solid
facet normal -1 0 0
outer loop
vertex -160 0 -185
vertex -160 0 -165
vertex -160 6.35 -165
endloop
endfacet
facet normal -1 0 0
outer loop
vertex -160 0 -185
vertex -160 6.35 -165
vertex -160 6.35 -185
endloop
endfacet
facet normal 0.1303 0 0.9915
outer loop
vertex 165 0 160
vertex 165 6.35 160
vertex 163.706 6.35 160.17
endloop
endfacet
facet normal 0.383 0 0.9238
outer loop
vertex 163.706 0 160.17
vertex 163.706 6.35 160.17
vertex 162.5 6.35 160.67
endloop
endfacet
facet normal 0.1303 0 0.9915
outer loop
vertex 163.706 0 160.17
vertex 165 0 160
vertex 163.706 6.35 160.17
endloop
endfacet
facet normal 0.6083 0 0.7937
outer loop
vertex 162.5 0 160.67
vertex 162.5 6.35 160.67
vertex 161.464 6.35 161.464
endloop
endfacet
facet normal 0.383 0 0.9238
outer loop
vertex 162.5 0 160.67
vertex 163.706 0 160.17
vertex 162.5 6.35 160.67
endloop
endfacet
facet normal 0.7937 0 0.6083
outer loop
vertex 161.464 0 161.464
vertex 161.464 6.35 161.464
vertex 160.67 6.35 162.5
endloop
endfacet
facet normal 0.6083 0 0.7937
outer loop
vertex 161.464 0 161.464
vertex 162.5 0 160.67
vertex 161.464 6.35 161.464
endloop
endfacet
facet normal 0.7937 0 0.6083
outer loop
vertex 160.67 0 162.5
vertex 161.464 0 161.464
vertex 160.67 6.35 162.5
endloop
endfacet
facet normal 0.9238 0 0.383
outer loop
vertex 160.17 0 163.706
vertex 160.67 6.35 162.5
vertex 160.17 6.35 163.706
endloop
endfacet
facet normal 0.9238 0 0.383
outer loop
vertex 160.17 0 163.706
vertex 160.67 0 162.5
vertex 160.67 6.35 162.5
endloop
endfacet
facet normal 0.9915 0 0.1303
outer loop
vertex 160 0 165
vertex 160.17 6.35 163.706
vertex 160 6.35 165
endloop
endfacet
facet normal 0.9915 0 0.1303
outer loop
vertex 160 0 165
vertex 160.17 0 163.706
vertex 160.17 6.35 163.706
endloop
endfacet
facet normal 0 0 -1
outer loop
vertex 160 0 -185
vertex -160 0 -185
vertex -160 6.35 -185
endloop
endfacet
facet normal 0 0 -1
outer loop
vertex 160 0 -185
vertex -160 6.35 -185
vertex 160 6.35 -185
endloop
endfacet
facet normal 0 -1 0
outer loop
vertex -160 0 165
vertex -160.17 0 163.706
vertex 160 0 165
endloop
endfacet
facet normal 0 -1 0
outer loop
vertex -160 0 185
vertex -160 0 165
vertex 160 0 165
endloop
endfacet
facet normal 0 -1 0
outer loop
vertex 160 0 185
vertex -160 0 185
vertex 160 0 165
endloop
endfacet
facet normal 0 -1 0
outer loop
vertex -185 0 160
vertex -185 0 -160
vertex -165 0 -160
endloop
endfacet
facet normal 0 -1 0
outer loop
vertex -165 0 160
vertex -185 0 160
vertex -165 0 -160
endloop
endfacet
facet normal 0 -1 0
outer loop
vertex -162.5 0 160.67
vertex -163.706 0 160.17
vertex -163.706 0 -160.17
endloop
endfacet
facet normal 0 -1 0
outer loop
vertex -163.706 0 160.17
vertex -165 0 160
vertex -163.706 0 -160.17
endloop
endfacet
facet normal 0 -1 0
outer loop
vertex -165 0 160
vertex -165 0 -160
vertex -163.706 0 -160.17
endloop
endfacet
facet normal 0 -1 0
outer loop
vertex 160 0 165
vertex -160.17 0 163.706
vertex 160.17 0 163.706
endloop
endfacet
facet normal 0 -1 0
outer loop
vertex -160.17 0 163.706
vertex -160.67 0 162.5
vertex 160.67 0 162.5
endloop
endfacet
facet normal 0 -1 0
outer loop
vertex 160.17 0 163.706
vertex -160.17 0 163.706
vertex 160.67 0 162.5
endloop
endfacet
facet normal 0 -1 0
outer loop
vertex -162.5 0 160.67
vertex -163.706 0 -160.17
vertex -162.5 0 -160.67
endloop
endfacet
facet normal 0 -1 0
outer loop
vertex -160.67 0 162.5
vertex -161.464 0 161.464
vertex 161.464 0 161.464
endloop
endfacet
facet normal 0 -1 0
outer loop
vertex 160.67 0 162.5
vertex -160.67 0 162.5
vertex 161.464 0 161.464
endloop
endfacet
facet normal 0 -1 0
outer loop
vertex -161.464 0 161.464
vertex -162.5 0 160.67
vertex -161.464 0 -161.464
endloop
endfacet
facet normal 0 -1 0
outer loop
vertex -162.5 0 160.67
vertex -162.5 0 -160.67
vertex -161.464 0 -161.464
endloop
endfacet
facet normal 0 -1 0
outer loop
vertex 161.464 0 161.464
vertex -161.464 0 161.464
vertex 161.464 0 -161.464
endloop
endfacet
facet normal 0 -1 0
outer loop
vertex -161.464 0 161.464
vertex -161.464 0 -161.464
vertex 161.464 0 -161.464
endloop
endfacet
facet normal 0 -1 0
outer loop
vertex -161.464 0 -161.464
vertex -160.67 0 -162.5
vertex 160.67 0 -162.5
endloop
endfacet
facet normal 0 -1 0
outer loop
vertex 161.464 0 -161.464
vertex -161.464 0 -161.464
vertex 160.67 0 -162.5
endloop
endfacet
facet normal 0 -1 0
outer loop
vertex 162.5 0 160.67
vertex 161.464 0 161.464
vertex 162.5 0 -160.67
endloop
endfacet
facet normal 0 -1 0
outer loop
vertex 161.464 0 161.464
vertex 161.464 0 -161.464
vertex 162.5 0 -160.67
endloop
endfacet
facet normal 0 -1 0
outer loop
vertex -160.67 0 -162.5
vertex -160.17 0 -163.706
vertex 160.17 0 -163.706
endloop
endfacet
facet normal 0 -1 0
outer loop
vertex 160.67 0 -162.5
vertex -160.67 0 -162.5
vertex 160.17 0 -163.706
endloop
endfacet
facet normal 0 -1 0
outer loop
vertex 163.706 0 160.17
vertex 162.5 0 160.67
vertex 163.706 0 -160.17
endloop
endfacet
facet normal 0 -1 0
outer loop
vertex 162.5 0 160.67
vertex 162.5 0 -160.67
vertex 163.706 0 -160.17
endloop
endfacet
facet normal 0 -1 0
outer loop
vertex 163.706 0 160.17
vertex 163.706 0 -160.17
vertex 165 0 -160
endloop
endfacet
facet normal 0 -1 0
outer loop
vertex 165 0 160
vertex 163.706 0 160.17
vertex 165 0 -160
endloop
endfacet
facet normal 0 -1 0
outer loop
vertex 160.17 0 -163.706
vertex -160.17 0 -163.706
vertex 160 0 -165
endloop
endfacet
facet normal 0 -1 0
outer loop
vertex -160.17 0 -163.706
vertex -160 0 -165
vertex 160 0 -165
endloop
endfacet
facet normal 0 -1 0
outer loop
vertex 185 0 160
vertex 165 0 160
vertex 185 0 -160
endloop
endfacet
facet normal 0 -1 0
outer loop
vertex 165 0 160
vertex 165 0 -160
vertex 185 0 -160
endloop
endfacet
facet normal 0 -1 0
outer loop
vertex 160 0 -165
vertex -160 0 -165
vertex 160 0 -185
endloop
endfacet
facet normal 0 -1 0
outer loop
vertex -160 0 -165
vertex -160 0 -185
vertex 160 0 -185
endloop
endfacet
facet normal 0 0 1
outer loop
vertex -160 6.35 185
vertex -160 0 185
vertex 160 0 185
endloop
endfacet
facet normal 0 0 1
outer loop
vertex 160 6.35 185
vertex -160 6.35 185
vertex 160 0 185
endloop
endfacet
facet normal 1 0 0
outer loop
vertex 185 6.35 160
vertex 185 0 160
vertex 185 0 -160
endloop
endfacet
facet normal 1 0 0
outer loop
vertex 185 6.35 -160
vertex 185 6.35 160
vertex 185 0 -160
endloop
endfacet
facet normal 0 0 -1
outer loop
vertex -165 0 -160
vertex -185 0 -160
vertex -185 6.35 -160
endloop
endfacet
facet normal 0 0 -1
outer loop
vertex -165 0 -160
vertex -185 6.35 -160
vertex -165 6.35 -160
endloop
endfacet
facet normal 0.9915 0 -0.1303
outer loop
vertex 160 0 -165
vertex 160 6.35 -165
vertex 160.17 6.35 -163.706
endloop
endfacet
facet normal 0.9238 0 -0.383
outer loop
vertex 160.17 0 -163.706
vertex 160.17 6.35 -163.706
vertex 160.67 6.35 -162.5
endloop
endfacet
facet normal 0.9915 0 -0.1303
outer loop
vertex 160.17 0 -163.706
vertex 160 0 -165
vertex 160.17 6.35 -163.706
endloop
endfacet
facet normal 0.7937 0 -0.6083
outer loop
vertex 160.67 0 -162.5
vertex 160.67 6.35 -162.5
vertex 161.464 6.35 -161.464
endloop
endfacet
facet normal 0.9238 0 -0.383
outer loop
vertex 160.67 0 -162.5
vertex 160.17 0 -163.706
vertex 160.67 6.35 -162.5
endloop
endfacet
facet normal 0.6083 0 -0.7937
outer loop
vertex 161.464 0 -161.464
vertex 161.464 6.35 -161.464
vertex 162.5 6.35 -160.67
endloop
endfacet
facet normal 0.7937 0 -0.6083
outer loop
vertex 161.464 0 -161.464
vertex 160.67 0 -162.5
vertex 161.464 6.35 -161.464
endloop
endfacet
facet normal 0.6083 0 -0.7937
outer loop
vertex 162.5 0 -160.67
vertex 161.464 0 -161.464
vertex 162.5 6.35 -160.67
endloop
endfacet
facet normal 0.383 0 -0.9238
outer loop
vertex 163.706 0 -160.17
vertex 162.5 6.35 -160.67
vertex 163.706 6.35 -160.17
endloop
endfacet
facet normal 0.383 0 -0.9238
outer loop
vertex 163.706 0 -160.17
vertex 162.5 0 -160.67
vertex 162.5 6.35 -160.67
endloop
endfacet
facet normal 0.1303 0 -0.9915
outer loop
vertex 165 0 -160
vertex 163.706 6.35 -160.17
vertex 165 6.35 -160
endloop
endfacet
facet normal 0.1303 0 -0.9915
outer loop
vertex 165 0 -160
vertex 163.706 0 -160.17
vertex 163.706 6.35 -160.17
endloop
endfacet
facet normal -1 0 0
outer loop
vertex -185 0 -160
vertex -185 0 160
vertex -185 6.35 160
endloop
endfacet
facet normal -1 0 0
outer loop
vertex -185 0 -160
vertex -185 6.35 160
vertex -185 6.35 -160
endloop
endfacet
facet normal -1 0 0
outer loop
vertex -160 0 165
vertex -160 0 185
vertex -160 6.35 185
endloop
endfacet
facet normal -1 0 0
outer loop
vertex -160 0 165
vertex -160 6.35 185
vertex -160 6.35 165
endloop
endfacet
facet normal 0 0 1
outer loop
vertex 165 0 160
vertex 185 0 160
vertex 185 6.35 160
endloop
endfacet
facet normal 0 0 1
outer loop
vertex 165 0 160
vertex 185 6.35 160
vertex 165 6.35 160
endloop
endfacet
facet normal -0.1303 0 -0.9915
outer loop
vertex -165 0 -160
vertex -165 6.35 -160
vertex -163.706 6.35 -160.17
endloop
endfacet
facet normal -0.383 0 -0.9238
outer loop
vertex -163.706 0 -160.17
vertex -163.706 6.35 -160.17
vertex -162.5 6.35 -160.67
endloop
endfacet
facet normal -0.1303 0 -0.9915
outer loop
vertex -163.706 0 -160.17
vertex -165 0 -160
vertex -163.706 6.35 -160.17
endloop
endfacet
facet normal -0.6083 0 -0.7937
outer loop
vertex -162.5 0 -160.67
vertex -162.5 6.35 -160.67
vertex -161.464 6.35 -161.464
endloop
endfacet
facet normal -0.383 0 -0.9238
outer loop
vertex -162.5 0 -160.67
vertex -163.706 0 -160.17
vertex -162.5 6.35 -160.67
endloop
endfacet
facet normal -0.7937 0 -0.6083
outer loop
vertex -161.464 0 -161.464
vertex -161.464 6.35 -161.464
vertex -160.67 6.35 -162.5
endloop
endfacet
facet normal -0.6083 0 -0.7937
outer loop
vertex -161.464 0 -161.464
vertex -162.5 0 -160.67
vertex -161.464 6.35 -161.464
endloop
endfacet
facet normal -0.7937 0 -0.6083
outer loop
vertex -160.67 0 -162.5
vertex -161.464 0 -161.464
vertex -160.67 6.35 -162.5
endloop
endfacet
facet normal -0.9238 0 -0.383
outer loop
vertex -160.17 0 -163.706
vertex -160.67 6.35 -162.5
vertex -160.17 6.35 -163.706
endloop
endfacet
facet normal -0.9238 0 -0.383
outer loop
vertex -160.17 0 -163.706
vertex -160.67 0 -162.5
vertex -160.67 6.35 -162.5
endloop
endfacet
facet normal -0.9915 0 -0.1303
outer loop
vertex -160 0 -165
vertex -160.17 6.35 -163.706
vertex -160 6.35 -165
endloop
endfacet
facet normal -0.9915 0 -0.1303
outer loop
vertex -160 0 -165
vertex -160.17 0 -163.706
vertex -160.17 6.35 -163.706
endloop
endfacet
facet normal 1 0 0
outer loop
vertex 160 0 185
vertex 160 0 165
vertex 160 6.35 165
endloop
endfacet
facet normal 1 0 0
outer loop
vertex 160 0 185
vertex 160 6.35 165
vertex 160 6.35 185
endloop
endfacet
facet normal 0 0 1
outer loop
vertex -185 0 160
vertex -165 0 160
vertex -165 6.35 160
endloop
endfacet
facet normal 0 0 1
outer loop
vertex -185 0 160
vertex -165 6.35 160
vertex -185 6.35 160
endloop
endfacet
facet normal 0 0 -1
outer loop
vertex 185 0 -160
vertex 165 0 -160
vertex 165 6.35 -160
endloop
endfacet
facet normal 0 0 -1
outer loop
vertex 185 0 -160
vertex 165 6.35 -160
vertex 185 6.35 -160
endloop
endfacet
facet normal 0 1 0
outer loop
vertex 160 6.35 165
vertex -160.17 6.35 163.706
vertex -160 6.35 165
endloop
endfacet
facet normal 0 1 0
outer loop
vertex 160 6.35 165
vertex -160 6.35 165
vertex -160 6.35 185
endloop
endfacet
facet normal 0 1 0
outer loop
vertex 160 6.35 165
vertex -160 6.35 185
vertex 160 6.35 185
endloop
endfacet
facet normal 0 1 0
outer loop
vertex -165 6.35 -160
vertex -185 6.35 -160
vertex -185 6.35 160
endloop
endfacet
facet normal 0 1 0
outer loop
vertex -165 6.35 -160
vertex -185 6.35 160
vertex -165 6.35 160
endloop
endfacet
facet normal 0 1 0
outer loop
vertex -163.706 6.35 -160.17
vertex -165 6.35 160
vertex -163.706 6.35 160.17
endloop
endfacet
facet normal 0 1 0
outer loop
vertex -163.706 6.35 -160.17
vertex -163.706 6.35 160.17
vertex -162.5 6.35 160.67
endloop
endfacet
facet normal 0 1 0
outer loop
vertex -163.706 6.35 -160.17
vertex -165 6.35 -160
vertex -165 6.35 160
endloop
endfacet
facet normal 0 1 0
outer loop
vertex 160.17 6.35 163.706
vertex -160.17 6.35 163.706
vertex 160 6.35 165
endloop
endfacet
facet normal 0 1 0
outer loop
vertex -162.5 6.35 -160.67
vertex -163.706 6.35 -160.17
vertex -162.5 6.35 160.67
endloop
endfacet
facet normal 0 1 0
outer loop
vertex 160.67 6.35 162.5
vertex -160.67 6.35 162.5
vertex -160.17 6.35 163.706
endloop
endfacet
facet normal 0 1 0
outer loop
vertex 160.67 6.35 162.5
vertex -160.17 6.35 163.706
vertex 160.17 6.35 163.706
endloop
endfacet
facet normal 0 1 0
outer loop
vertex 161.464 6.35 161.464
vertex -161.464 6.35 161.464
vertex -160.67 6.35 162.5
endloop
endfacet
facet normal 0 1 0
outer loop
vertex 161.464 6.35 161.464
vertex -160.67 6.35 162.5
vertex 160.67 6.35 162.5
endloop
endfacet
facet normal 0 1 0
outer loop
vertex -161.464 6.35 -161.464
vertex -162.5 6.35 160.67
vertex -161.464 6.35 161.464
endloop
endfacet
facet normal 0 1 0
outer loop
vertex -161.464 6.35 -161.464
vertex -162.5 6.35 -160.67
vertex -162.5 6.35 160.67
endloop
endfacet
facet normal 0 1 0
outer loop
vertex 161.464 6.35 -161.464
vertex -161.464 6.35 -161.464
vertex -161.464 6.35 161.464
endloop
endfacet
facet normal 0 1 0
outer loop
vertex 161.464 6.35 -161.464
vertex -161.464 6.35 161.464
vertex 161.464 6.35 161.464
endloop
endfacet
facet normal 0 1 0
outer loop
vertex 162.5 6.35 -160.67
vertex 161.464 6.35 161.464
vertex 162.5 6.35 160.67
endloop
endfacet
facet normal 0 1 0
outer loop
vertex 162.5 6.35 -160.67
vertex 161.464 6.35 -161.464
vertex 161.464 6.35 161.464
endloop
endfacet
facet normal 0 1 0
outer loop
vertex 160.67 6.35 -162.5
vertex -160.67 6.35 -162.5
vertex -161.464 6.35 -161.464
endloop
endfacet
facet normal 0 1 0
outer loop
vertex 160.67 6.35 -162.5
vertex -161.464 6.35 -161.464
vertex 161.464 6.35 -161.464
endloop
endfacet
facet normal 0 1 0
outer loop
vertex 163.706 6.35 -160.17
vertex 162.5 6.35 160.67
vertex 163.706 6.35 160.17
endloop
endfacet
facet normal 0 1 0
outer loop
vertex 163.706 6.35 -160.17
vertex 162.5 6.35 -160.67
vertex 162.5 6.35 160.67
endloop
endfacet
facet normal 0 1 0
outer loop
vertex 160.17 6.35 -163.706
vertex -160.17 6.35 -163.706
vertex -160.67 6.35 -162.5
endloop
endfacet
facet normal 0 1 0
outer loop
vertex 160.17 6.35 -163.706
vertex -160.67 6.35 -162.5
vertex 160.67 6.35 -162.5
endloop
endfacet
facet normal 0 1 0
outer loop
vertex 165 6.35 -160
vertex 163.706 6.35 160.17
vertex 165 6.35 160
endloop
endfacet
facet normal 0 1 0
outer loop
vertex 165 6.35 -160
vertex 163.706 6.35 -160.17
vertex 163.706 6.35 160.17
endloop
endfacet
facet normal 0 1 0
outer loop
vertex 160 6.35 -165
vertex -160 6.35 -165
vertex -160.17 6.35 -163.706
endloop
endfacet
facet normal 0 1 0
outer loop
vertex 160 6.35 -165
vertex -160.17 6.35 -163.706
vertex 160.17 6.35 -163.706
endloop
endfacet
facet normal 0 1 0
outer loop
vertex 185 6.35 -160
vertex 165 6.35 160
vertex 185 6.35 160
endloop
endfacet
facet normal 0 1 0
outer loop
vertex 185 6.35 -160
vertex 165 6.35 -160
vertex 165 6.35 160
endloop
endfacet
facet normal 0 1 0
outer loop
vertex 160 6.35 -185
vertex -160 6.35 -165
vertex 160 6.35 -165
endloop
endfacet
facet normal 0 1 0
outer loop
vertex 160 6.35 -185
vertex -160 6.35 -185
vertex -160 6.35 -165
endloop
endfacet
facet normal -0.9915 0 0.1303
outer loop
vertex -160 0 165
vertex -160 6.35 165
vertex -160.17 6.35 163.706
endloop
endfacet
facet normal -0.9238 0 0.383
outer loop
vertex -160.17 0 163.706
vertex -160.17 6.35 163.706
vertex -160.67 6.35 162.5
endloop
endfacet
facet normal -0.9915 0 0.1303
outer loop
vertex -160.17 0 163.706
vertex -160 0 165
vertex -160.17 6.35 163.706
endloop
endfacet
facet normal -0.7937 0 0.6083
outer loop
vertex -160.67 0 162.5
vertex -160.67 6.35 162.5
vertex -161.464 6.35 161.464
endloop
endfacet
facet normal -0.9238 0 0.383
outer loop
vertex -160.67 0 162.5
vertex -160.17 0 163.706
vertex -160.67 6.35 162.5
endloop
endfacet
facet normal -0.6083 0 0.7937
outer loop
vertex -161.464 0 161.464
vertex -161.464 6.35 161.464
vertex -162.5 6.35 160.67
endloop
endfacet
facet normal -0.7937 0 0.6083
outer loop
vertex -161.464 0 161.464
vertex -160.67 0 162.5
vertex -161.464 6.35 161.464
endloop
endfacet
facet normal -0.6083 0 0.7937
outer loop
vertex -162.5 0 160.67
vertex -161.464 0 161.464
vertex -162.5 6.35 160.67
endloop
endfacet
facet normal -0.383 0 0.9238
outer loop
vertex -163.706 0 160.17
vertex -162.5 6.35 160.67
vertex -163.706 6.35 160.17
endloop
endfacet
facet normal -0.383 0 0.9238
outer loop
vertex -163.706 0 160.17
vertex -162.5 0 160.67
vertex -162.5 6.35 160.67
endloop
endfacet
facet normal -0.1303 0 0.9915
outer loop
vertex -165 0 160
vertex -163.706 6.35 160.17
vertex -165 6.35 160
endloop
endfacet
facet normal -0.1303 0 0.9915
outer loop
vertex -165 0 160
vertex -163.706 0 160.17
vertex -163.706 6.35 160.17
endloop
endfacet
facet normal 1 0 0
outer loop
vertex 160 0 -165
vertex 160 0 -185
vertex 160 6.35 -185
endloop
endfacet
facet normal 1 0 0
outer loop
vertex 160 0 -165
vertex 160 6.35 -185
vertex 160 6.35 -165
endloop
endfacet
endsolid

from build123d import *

# Parameters (mm, degrees)
SKETCH1_W                      = 370
SKETCH1_H                      = 370
BOSS_EXTRUDE1_DEPTH            = 6.35
CUT_EXTRUDE2_REACH             = 263.707
CUT_EXTRUDE2_DIRECTION_2_DEPTH = 262.706558


with BuildPart() as part:
    # Sketch1 → Boss-Extrude1 (new body)
    with BuildSketch(Plane(origin=(0, 0, 0), x_dir=(1, 0, 0), z_dir=(0, 1, 0))):
        Rectangle(SKETCH1_W, SKETCH1_H)
    extrude(amount=BOSS_EXTRUDE1_DEPTH)

    # Sketch2 → Cut-Extrude2 (cut, up to next)
    with BuildSketch(Plane(origin=(0, 0, 0), x_dir=(1, 0, 0), z_dir=(0, 1, 0)), mode=Mode.PRIVATE) as cut_extrude2_sk1:
        with BuildLine():
            Line((-185, 185), (-185, 160))
            Line((-185, 160), (-165, 160))
            ThreePointArc((-165, 160), (-161.464466094, 161.464466094), (-160, 165))
            Line((-160, 165), (-160, 185))
            Line((-160, 185), (-185, 185))
        make_face()
    cut_extrude2_tool1 = extrude(cut_extrude2_sk1.sketch, amount=CUT_EXTRUDE2_REACH, mode=Mode.PRIVATE) & part.part
    # Sketch2 → Cut-Extrude2 (cut, up to next)
    with BuildSketch(Plane(origin=(0, 0, 0), x_dir=(1, 0, 0), z_dir=(0, 1, 0)), mode=Mode.PRIVATE) as cut_extrude2_sk2:
        with BuildLine():
            Line((-185, -185), (-160, -185))
            Line((-160, -185), (-160, -165))
            ThreePointArc((-160, -165), (-161.464466094, -161.464466094), (-165, -160))
            Line((-165, -160), (-185, -160))
            Line((-185, -160), (-185, -185))
        make_face()
    cut_extrude2_tool2 = extrude(cut_extrude2_sk2.sketch, amount=CUT_EXTRUDE2_REACH, mode=Mode.PRIVATE) & part.part
    # Sketch2 → Cut-Extrude2 (cut, up to next)
    with BuildSketch(Plane(origin=(0, 0, 0), x_dir=(1, 0, 0), z_dir=(0, 1, 0)), mode=Mode.PRIVATE) as cut_extrude2_sk3:
        with BuildLine():
            Line((185, 185), (160, 185))
            Line((160, 185), (160, 165))
            ThreePointArc((160, 165), (161.464466094, 161.464466094), (165, 160))
            Line((165, 160), (185, 160))
            Line((185, 160), (185, 185))
        make_face()
    cut_extrude2_tool3 = extrude(cut_extrude2_sk3.sketch, amount=CUT_EXTRUDE2_REACH, mode=Mode.PRIVATE) & part.part
    # Sketch2 → Cut-Extrude2 (cut, up to next)
    with BuildSketch(Plane(origin=(0, 0, 0), x_dir=(1, 0, 0), z_dir=(0, 1, 0)), mode=Mode.PRIVATE) as cut_extrude2_sk4:
        with BuildLine():
            Line((185, -185), (185, -160))
            Line((185, -160), (165, -160))
            ThreePointArc((165, -160), (161.464466094, -161.464466094), (160, -165))
            Line((160, -165), (160, -185))
            Line((160, -185), (185, -185))
        make_face()
    cut_extrude2_tool4 = extrude(cut_extrude2_sk4.sketch, amount=CUT_EXTRUDE2_REACH, mode=Mode.PRIVATE) & part.part
    add(cut_extrude2_tool1.solids().sort_by_distance((-172.59856, 0, -172.59856))[0], mode=Mode.SUBTRACT)
    add(cut_extrude2_tool2.solids().sort_by_distance((-172.59856, 0, 172.59856))[0], mode=Mode.SUBTRACT)
    add(cut_extrude2_tool3.solids().sort_by_distance((172.59856, 0, -172.59856))[0], mode=Mode.SUBTRACT)
    add(cut_extrude2_tool4.solids().sort_by_distance((172.59856, 0, 172.59856))[0], mode=Mode.SUBTRACT)

    # Sketch2 → Cut-Extrude2 direction 2 (cut)
    with BuildSketch(Plane(origin=(0, 0, 0), x_dir=(1, 0, 0), z_dir=(0, 1, 0))):
        with BuildLine():
            Line((-185, 185), (-185, 160))
            Line((-185, 160), (-165, 160))
            ThreePointArc((-165, 160), (-161.464466094, 161.464466094), (-160, 165))
            Line((-160, 165), (-160, 185))
            Line((-160, 185), (-185, 185))
        make_face()
        with BuildLine():
            Line((-185, -185), (-160, -185))
            Line((-160, -185), (-160, -165))
            ThreePointArc((-160, -165), (-161.464466094, -161.464466094), (-165, -160))
            Line((-165, -160), (-185, -160))
            Line((-185, -160), (-185, -185))
        make_face()
        with BuildLine():
            Line((185, 185), (160, 185))
            Line((160, 185), (160, 165))
            ThreePointArc((160, 165), (161.464466094, 161.464466094), (165, 160))
            Line((165, 160), (185, 160))
            Line((185, 160), (185, 185))
        make_face()
        with BuildLine():
            Line((185, -185), (185, -160))
            Line((185, -160), (165, -160))
            ThreePointArc((165, -160), (161.464466094, -161.464466094), (160, -165))
            Line((160, -165), (160, -185))
            Line((160, -185), (185, -185))
        make_face()
    extrude(amount=-CUT_EXTRUDE2_DIRECTION_2_DEPTH, mode=Mode.SUBTRACT)


solid = part.part
